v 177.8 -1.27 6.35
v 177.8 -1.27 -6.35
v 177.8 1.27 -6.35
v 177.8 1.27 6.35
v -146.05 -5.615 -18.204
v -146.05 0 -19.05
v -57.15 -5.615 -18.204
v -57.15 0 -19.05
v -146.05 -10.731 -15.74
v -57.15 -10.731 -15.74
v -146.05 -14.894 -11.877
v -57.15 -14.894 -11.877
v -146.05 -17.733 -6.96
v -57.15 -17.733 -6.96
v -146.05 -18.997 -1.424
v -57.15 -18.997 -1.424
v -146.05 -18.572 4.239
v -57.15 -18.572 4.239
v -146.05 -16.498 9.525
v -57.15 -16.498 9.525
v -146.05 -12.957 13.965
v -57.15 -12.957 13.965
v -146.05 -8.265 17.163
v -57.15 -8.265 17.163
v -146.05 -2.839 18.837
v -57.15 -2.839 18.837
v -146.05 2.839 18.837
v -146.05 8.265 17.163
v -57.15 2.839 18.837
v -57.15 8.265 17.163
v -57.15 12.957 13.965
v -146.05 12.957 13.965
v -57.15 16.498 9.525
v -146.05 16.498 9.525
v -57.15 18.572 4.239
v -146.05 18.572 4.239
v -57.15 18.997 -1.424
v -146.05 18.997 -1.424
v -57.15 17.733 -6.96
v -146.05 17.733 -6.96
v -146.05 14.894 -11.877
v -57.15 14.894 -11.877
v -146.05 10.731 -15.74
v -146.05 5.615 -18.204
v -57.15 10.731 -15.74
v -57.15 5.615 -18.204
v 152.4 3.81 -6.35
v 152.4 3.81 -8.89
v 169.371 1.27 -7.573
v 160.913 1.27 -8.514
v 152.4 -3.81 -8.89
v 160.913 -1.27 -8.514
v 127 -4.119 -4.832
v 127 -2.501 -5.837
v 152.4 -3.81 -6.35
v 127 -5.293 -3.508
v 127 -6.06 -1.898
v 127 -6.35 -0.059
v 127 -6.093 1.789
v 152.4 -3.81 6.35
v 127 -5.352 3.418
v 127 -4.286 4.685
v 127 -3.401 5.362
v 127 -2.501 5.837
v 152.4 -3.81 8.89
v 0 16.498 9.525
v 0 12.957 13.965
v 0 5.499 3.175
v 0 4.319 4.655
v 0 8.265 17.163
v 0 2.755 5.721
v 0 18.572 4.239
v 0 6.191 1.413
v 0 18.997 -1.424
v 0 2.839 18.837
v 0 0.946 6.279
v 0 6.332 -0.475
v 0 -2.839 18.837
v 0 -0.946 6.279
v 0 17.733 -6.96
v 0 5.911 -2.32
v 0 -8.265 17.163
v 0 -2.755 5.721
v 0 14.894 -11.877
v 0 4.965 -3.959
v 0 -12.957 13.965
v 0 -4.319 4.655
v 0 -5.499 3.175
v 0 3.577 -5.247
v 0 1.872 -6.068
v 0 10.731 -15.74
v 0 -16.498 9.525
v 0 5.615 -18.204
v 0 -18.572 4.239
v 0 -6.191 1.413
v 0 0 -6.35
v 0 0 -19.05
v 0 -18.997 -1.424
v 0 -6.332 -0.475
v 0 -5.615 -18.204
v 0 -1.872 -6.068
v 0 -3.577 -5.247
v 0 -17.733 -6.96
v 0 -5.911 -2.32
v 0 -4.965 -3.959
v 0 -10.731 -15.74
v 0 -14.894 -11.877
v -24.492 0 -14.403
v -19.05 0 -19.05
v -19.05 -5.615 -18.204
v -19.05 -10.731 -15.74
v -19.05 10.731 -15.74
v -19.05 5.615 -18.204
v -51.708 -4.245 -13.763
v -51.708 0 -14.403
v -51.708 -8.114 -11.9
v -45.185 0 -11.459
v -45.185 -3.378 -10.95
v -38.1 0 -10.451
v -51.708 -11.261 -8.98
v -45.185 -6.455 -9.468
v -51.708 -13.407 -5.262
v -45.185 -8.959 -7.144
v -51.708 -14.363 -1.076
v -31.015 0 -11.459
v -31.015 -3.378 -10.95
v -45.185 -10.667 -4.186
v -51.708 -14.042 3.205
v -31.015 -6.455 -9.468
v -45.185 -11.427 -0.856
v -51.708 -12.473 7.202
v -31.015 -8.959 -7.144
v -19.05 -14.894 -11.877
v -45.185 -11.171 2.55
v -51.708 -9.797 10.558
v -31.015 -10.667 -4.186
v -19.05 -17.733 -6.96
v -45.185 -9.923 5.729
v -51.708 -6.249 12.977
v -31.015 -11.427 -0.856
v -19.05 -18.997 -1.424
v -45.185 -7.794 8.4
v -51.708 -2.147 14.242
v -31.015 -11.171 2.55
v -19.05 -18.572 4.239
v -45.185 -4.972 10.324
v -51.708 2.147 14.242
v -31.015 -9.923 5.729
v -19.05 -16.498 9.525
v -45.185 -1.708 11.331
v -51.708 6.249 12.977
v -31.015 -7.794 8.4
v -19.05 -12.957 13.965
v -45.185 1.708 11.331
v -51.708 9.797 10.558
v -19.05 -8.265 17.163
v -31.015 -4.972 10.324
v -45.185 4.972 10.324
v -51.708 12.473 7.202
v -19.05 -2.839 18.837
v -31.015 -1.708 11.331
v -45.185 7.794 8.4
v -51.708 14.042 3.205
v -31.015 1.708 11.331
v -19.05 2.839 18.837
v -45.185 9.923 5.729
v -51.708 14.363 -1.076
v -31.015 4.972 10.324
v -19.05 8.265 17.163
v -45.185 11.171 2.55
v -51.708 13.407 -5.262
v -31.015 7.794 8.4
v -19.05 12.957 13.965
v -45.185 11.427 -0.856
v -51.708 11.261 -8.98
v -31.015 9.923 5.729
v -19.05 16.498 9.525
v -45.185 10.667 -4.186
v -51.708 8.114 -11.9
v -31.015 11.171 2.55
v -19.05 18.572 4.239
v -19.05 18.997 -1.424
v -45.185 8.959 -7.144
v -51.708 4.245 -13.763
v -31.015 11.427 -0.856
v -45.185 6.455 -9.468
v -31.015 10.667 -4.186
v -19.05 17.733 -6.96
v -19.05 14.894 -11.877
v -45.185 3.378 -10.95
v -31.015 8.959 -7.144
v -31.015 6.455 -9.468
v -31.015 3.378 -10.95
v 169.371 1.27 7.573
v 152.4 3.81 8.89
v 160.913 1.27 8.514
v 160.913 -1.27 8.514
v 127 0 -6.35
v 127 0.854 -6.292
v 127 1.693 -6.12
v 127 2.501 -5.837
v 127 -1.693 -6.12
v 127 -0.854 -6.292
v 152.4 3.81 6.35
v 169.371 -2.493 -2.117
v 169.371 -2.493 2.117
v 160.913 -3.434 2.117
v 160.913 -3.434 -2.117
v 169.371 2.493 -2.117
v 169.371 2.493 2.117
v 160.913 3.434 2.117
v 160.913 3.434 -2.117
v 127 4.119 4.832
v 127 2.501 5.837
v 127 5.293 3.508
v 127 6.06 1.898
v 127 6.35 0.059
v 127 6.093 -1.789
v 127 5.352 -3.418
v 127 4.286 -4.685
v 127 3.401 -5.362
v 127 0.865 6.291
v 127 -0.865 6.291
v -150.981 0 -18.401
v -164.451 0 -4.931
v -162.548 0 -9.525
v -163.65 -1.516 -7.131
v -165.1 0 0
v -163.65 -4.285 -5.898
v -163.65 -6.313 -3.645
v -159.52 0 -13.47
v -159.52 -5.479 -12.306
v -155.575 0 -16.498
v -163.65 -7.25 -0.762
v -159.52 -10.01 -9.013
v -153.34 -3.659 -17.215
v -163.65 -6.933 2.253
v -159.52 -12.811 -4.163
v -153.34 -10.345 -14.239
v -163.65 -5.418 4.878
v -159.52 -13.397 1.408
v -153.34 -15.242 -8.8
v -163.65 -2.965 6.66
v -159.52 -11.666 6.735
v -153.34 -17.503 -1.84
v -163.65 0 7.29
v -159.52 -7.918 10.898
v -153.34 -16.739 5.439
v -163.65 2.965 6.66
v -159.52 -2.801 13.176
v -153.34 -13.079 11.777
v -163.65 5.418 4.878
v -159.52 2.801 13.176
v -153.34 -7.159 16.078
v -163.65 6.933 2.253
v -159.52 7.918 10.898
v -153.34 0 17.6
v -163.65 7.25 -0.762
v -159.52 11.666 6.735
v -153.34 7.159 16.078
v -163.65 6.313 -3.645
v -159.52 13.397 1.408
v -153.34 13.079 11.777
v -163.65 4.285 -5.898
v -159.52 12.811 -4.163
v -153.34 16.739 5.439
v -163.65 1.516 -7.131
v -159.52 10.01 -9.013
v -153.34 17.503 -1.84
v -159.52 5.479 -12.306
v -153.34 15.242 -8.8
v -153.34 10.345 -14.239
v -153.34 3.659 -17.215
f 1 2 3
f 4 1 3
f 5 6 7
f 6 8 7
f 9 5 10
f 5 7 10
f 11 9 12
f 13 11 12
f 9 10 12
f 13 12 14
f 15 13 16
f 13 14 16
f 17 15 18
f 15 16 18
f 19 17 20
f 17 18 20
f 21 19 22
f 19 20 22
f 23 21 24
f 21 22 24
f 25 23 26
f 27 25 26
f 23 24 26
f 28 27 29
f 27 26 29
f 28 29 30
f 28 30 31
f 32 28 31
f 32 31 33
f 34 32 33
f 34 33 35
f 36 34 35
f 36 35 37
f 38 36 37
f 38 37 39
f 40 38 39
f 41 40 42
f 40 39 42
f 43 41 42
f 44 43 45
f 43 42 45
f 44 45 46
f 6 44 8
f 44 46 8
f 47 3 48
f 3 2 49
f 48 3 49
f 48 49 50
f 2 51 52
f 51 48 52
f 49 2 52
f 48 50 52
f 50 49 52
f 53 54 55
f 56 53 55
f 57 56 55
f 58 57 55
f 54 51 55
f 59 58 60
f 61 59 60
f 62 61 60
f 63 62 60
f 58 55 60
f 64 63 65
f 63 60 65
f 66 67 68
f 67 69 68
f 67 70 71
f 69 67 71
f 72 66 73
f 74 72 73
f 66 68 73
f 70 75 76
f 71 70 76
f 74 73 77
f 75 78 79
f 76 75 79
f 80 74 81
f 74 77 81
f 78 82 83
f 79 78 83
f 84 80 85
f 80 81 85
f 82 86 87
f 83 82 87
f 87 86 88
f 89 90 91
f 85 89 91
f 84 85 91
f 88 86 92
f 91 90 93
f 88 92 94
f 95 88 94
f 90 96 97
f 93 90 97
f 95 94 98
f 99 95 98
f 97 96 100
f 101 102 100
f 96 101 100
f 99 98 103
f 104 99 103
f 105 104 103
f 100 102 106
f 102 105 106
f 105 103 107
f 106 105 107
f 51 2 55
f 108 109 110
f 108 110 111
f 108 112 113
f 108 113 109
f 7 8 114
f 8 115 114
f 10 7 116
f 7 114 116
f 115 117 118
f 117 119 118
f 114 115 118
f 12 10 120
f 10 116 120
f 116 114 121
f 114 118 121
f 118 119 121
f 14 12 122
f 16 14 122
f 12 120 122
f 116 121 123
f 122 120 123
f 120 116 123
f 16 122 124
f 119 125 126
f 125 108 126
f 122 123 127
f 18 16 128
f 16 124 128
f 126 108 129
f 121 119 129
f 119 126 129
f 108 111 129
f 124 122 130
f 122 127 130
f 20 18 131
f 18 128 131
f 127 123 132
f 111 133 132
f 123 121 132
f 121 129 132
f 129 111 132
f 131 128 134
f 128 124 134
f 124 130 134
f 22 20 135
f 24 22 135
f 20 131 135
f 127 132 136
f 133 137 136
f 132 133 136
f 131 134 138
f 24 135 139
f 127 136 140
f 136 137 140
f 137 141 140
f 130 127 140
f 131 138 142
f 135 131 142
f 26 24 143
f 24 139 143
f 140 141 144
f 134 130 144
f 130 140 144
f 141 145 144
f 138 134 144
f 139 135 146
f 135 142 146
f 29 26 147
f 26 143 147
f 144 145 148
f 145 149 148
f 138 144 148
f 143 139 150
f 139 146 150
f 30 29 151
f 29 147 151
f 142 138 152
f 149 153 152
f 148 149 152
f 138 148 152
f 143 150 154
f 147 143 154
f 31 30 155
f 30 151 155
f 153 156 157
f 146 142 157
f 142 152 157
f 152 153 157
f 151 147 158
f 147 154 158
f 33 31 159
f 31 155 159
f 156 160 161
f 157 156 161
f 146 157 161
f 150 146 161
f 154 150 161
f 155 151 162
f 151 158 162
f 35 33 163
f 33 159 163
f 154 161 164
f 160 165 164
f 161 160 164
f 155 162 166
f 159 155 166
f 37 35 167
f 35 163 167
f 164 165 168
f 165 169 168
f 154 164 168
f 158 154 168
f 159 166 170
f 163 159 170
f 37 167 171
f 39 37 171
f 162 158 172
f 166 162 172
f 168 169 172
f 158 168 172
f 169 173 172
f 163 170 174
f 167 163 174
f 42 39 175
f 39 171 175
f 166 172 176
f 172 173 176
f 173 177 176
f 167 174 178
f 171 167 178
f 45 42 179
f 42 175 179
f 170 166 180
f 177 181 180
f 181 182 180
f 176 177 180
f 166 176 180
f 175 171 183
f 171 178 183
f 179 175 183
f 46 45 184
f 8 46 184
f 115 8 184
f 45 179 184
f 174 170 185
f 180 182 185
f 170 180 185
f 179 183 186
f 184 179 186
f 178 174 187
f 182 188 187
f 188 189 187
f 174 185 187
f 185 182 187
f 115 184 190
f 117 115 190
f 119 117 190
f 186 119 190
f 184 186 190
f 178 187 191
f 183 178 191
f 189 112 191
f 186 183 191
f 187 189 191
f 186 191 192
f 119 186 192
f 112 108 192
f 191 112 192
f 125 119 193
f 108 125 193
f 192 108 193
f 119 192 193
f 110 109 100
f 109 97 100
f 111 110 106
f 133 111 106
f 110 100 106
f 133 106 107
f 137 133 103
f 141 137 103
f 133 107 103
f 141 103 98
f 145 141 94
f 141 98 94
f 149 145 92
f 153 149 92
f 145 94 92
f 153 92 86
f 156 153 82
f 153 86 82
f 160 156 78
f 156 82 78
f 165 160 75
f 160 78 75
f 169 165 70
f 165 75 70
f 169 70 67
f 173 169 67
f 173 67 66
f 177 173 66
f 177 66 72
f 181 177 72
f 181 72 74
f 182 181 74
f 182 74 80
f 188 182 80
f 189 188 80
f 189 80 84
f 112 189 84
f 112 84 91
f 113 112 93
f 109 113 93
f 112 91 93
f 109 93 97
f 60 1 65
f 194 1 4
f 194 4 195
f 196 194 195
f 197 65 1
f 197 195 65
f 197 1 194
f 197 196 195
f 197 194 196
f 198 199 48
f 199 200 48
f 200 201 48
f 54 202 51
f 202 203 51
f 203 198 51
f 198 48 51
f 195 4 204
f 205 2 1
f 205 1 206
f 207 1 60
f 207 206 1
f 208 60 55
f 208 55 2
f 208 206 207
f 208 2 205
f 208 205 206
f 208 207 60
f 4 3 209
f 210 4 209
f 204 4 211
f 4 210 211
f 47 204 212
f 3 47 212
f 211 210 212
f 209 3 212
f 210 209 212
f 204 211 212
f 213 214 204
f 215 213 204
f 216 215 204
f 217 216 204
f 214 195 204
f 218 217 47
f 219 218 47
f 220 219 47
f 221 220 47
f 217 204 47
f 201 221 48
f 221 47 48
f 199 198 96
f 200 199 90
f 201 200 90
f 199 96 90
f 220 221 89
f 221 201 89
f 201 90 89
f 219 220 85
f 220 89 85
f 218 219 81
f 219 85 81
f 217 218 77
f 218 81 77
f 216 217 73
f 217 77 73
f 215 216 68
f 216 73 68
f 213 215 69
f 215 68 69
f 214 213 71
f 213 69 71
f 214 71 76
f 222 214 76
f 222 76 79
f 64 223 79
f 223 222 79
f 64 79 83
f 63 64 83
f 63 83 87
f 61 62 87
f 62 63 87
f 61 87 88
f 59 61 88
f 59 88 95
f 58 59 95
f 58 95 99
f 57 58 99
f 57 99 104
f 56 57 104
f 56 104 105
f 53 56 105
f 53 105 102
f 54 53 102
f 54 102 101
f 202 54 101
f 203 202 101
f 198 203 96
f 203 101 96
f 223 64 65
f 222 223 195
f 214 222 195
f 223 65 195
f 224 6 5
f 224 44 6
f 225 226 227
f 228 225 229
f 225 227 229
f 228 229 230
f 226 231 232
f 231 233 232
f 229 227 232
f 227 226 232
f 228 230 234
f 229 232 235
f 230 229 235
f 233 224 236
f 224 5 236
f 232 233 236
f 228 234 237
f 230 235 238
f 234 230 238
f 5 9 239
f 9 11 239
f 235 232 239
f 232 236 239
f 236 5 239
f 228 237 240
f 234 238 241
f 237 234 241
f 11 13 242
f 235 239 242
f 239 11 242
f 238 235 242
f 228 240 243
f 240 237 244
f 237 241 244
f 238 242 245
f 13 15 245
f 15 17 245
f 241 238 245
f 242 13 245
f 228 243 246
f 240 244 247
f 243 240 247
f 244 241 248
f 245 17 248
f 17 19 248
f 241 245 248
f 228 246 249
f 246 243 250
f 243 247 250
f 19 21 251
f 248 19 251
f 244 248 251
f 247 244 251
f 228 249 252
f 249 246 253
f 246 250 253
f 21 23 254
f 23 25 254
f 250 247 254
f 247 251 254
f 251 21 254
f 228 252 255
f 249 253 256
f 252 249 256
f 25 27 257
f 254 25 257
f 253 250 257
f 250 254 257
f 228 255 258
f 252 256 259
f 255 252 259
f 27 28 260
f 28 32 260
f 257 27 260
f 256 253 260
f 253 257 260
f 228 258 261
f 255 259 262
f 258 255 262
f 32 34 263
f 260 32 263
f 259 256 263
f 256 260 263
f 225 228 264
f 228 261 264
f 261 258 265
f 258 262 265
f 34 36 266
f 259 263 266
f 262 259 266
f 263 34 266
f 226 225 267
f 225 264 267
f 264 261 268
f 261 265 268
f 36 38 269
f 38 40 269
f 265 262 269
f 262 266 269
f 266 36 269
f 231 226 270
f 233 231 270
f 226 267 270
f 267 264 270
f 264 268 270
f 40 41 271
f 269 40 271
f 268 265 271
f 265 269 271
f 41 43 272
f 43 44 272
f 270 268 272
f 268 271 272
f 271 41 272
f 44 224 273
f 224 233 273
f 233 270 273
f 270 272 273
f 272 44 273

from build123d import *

# Parameters (mm, degrees)
SKETCH6_R           = 6.35
BOSS_EXTRUDE1_DEPTH = 127
LOFT6_START         = -6.35
LOFT6_DEPTH         = 12.6999999
LOFT6_START_2       = -3.8100001
LOFT6_2_DEPTH       = 7.6200001
LOFT6_START_3       = -10
LOFT6_3_DEPTH       = 20


with BuildPart() as part:
    # Sketch3 → Revolve2 (revolve)
    with BuildSketch(Plane(origin=(0, 0, 0), x_dir=(0, 1, 0), z_dir=(0, 0, 1)), mode=Mode.PRIVATE) as revolve2_sk:
        with BuildLine():
            ThreePointArc((19.05, 57.15), (10.450520825, 38.1), (19.05, 19.05))
            Line((19.05, 19.05), (19.05, 0))
            Line((19.05, 0), (0, 0))
            Line((0, 0), (0, 165.1))
            ThreePointArc((0, 165.1), (13.470384182, 159.520384182), (19.05, 146.05))
            Line((19.05, 146.05), (19.05, 57.15))
        make_face()
    revolve(revolve2_sk.sketch.rotate(Axis((0, 0, 0), (-1, 0, 0)), 90), axis=Axis((0, 0, 0), (-1, 0, 0)))

    # Sketch6 → Boss-Extrude1 (add)
    with BuildSketch(Plane.YZ):
        with Locations(Location((0, 0, 0), (0, 0, 270))):
            Circle(SKETCH6_R)
    extrude(amount=BOSS_EXTRUDE1_DEPTH)

    # Sketch7 for Loft5 → Loft5 section 0
    with BuildSketch(Plane(origin=(127, 0, 0), x_dir=(0, 0, -1), z_dir=(1, 0, 0))):
        with BuildLine():
            # circular arc as an exact rational Bezier (weights 1, cos(half-angle), 1)
            Bezier((-5.836570941, 2.501387546), (0, 16.120053073), (5.836570941, 2.501387546), weights=[1, 0.393919299, 1])
            Bezier((5.836570941, 2.501387546), (6.908594174, 0), (5.836570941, -2.501387546), weights=[1, 0.91914503, 1])
            Bezier((5.836570941, -2.501387546), (0, -16.120053073), (-5.836570941, -2.501387546), weights=[1, 0.393919299, 1])
            Bezier((-5.836570941, -2.501387546), (-6.908594174, 0), (-5.836570941, 2.501387546), weights=[1, 0.91914503, 1])
        make_face()
    # Sketch4 → Loft5 section 1
    with BuildSketch(Plane(origin=(152.4, 0, 0), x_dir=(0, 0, -1), z_dir=(1, 0, 0))):
        with BuildLine():
            Line((-8.89, 3.81), (8.89, 3.81))
            Line((8.89, 3.81), (8.89, -3.81))
            Line((8.89, -3.81), (-8.89, -3.81))
            Line((-8.89, -3.81), (-8.89, 3.81))
        make_face()
    loft()

    # Loft6: read off the stored shape, not the designer's step
    # Loft6 outline → Loft6 (add)
    with BuildSketch(Plane.XY.offset(LOFT6_START)):
        with BuildLine():
            Line((177.8, -1.27), (177.8, 1.27))
            add(Edge.make_bspline(
                [(177.8, 1.27), (169.375457091, 2.54), (160.950914181, 3.81), (152.4, 3.81)],
                knots=[0, 0, 0, 0, 1, 1, 1, 1], degree=3))
            Line((152.4, 3.81), (152.4, -3.81))
            add(Edge.make_bspline(
                [(177.8, -1.27), (169.375457091, -2.54), (160.950914181, -3.81), (152.4, -3.81)],
                knots=[0, 0, 0, 0, 1, 1, 1, 1], degree=3))
        make_face()
    extrude(amount=LOFT6_DEPTH)

    # Loft6 2 outline → Loft6 2 (add)
    with BuildSketch(Plane(origin=(0, 0, 0), x_dir=(1, 0, 0), z_dir=(0, 1, 0)).offset(LOFT6_START_2)):
        with BuildLine():
            Line((152.4, 6.35), (177.8, 6.35))
            add(Edge.make_bspline(
                [(177.8, 6.35), (169.375457091, 7.62), (160.950914181, 8.89), (152.4, 8.89)],
                knots=[0, 0, 0, 0, 1, 1, 1, 1], degree=3))
            Line((152.4, 8.89), (152.4, 6.35))
        make_face()
        with BuildLine():
            add(Edge.make_bspline(
                [(177.8, -6.35), (169.375457091, -7.62), (160.950914181, -8.89), (152.4, -8.89)],
                knots=[0, 0, 0, 0, 1, 1, 1, 1], degree=3))
            Line((177.8, -6.35), (152.4, -6.3499999))
            Line((152.4, -6.3499999), (152.4, -8.89))
        make_face()
    extrude(amount=LOFT6_2_DEPTH)

    # Loft6 3 outline → Loft6 3 (cut)
    with BuildSketch(Plane.XY.offset(LOFT6_START_3)):
        with BuildLine():
            add(Edge.make_bspline(
                [(177.8, 1.27), (169.375457091, 2.54), (160.950914181, 3.81), (152.4, 3.81)],
                knots=[0, 0, 0, 0, 1, 1, 1, 1], degree=3))
            Line((177.8, 1.27), (177.8, 3.81))
            Line((177.8, 3.81), (152.4, 3.81))
        make_face()
        with BuildLine():
            add(Edge.make_bspline(
                [(177.8, -1.27), (169.375457091, -2.54), (160.950914181, -3.81), (152.4, -3.81)],
                knots=[0, 0, 0, 0, 1, 1, 1, 1], degree=3))
            Line((152.4, -3.81), (177.8, -3.8100001))
            Line((177.8, -3.8100001), (177.8, -1.27))
        make_face()
    extrude(amount=LOFT6_3_DEPTH, mode=Mode.SUBTRACT)


solid = part.part
